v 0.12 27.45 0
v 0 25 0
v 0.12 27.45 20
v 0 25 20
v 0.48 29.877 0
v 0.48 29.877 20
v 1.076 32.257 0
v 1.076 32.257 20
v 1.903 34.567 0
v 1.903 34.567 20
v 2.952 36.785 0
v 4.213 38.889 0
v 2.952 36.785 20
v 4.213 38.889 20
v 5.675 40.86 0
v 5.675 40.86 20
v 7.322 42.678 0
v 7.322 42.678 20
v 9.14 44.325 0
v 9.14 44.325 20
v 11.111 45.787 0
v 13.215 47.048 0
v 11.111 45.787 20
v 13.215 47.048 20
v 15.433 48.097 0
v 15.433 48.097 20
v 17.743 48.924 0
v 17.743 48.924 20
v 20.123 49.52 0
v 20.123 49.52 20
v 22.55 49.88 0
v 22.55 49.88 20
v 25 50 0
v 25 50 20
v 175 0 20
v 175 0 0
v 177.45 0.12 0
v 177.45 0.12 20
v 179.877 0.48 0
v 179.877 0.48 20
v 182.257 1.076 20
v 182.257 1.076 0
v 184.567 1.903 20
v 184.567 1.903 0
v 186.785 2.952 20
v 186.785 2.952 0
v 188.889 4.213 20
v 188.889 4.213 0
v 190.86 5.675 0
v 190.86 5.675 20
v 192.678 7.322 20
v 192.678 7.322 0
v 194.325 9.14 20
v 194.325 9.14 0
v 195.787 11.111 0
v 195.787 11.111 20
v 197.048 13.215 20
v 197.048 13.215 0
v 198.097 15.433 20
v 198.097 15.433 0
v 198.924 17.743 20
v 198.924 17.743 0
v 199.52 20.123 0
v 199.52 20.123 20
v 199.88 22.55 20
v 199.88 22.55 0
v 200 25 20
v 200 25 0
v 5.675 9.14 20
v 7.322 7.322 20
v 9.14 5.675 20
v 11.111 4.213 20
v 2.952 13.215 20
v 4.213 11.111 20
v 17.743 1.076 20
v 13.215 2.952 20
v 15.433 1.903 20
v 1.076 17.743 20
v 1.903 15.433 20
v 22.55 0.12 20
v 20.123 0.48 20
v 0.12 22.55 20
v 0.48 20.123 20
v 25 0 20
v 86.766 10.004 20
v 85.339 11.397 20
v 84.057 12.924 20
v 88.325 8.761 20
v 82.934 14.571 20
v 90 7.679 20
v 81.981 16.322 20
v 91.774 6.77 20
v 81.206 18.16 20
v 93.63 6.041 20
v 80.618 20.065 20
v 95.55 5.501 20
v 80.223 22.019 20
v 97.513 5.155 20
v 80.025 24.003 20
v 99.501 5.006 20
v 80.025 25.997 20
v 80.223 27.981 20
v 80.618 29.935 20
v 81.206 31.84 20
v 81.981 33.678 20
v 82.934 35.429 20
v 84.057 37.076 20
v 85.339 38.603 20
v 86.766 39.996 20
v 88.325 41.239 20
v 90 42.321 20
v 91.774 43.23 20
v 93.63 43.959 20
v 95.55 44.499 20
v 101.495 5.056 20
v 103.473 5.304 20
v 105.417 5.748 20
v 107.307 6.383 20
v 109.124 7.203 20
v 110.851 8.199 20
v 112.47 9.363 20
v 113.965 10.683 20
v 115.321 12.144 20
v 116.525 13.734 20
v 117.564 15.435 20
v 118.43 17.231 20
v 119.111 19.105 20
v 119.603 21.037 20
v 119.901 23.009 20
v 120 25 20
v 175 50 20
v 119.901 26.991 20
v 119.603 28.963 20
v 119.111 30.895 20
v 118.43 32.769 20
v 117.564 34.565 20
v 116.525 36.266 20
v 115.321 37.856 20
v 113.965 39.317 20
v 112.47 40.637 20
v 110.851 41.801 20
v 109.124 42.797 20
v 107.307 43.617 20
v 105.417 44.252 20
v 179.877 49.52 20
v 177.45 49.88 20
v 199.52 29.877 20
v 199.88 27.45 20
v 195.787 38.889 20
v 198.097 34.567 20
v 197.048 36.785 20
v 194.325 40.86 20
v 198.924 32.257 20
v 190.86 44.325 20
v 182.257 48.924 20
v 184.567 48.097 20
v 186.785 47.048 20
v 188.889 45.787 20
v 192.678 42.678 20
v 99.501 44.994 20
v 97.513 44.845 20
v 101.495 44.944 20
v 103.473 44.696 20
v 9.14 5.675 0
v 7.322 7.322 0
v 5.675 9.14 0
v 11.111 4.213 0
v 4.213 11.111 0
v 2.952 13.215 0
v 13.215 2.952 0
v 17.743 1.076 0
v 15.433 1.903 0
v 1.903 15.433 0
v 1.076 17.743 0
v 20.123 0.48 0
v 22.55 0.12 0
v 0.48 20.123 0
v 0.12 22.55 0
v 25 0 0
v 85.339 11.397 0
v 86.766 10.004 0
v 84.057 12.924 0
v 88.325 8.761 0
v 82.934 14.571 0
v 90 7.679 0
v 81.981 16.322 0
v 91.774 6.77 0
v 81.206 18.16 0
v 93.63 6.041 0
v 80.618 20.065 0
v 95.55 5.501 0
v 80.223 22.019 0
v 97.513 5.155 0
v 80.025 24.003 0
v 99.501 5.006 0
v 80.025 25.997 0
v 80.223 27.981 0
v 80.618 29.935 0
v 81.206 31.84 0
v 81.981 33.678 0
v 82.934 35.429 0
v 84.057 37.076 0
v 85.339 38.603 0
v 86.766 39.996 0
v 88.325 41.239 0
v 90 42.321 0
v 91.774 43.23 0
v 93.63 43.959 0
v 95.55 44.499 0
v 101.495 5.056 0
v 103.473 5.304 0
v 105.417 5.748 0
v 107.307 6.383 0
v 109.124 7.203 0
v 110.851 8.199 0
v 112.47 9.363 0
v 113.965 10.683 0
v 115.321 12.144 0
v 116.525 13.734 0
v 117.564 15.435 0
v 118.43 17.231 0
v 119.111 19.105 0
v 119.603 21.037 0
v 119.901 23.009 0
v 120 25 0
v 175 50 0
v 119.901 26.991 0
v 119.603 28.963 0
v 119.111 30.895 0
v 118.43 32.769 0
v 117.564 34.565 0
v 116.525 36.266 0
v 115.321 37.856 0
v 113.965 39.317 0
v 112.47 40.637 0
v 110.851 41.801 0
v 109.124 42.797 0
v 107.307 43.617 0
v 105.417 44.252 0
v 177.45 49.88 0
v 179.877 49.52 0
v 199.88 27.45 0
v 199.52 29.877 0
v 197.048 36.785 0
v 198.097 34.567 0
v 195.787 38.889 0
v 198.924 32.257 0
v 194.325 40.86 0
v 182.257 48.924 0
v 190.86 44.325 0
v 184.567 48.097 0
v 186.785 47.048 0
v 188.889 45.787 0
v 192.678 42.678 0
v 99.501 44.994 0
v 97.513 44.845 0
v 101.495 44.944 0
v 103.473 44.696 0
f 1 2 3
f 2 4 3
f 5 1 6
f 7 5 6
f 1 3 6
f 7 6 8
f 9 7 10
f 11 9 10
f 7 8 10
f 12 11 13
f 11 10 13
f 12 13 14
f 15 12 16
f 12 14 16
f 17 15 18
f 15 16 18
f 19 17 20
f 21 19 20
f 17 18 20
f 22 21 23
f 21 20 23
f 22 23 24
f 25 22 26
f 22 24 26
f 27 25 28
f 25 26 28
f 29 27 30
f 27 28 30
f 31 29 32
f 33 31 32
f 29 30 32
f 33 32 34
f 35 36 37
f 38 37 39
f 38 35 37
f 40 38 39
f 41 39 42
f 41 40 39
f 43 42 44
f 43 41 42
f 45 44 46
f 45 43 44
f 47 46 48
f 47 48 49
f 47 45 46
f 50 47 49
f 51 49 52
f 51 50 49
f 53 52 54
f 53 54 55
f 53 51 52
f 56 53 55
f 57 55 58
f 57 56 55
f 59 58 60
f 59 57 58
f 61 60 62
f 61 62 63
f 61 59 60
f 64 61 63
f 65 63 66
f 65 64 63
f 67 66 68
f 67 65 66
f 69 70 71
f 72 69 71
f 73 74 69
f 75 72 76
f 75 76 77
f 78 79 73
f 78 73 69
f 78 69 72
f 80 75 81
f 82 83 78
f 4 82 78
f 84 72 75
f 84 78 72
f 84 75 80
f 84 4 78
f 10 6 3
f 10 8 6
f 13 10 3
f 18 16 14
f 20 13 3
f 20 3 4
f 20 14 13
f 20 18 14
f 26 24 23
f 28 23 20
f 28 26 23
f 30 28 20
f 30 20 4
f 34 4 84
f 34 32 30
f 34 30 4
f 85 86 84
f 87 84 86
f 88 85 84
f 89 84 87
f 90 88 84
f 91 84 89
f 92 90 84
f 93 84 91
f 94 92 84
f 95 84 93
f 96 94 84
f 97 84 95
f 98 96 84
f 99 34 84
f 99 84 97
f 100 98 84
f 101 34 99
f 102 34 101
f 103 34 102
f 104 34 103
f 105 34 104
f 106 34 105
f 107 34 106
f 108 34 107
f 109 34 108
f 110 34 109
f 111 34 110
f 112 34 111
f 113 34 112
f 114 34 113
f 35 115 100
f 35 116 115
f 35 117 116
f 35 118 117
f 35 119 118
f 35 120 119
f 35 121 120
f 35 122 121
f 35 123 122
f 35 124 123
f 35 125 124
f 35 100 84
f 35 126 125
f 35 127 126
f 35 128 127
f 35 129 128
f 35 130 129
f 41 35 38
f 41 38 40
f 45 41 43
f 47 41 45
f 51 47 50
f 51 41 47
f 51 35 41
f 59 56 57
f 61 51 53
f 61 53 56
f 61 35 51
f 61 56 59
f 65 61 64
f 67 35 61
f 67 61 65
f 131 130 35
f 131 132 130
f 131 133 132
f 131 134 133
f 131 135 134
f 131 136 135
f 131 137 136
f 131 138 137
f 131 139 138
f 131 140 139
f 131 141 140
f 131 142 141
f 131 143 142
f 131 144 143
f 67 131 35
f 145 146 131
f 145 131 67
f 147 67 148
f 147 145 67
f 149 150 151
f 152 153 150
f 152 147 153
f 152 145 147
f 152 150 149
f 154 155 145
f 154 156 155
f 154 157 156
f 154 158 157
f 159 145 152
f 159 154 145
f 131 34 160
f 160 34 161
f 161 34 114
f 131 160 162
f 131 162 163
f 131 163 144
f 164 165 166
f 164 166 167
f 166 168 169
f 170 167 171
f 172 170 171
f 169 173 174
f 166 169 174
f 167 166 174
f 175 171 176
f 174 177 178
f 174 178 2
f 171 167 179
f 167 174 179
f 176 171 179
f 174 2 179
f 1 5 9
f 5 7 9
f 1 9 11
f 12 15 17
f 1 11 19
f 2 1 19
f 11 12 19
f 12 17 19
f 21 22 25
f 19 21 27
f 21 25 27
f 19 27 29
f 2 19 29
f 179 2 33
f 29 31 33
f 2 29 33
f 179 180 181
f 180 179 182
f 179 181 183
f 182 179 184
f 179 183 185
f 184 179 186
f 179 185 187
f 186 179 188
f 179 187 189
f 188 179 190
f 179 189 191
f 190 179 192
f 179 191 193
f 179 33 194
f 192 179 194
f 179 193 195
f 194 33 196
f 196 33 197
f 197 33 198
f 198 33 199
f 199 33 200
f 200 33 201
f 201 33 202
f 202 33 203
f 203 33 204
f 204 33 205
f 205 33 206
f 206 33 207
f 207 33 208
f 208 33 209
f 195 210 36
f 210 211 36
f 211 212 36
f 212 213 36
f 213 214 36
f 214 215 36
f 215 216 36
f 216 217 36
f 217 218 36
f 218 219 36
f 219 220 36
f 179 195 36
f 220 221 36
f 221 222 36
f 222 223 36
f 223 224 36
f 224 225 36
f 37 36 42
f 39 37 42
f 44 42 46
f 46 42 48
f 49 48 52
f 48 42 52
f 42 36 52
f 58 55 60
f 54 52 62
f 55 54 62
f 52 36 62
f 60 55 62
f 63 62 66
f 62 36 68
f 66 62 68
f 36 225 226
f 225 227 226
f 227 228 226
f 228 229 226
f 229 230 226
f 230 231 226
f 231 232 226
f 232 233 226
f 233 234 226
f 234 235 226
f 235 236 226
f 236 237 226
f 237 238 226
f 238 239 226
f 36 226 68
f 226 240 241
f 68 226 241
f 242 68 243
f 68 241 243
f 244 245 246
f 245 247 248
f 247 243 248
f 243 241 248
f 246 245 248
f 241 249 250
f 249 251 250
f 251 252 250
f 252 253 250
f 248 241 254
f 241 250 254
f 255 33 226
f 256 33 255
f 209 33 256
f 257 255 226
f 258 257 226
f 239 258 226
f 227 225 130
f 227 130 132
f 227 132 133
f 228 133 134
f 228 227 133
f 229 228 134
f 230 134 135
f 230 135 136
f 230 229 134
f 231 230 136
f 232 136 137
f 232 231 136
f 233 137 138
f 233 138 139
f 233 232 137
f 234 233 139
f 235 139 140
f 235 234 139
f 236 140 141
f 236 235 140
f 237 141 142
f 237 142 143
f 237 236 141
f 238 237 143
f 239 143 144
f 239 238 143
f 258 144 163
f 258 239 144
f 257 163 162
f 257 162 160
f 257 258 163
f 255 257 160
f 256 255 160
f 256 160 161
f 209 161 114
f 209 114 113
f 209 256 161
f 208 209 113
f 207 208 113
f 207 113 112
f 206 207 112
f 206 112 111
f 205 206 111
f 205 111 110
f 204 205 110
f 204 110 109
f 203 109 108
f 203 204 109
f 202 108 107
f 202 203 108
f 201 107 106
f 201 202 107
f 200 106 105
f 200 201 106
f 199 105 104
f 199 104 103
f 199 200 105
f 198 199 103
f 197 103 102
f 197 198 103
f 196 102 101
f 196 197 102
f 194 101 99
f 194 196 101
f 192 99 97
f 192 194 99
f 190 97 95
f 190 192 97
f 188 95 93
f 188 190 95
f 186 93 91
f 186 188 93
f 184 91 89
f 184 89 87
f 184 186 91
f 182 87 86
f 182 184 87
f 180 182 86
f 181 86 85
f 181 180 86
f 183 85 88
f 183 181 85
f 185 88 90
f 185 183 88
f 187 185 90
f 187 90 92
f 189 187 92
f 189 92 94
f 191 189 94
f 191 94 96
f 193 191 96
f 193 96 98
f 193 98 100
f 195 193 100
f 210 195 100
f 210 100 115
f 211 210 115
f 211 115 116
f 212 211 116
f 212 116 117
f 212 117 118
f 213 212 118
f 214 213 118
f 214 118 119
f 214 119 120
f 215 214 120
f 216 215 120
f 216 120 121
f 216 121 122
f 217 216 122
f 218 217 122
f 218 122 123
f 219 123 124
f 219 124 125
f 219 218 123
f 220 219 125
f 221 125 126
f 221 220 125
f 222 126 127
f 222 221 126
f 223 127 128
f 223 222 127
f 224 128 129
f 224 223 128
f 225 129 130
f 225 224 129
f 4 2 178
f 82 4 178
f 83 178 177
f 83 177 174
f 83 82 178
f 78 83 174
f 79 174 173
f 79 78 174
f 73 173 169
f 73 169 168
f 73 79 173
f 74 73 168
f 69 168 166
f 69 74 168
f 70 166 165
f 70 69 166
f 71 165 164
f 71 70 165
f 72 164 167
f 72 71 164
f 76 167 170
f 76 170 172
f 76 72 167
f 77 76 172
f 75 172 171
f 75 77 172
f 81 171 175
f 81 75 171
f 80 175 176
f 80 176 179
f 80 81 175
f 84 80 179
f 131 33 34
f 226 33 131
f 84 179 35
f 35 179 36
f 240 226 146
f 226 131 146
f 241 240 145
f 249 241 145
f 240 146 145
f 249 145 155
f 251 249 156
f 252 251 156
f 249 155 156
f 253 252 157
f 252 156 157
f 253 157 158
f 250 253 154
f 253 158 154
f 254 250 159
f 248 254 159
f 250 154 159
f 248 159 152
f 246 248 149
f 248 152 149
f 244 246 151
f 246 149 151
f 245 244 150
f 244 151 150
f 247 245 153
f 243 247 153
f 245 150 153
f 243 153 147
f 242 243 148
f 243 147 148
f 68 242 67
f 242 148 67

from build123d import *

# Parameters (mm, degrees)
F0_W     = 200
F0_H     = 50
F0_R     = 20
F1_DEPTH = 20
F2_R     = 24.99999


# Not quite as in the source:
# - a fillet or chamfer is up to 0.001 mm smaller than in the source, because OpenCascade refuses the exact size


with BuildPart() as f1:
    # F0 (on Top) → F1 (new body)
    with BuildSketch(Plane.XY):
        with Locations((100, 25)):
            Rectangle(F0_W, F0_H)
        with Locations((100, 25)):
            Circle(F0_R, mode=Mode.SUBTRACT)
    extrude(amount=F1_DEPTH)

    # F2 (radius 25 in the source; OpenCascade refuses exactly that, so slightly less here)
    f2_edges = [f1.edges().sort_by_distance(p)[0] for p in [
        (200, 0, 10),
        (0, 50, 10),
        (0, 0, 10),
        (200, 50, 10),
    ]]
    fillet(f2_edges, radius=F2_R)


solid = f1.part
